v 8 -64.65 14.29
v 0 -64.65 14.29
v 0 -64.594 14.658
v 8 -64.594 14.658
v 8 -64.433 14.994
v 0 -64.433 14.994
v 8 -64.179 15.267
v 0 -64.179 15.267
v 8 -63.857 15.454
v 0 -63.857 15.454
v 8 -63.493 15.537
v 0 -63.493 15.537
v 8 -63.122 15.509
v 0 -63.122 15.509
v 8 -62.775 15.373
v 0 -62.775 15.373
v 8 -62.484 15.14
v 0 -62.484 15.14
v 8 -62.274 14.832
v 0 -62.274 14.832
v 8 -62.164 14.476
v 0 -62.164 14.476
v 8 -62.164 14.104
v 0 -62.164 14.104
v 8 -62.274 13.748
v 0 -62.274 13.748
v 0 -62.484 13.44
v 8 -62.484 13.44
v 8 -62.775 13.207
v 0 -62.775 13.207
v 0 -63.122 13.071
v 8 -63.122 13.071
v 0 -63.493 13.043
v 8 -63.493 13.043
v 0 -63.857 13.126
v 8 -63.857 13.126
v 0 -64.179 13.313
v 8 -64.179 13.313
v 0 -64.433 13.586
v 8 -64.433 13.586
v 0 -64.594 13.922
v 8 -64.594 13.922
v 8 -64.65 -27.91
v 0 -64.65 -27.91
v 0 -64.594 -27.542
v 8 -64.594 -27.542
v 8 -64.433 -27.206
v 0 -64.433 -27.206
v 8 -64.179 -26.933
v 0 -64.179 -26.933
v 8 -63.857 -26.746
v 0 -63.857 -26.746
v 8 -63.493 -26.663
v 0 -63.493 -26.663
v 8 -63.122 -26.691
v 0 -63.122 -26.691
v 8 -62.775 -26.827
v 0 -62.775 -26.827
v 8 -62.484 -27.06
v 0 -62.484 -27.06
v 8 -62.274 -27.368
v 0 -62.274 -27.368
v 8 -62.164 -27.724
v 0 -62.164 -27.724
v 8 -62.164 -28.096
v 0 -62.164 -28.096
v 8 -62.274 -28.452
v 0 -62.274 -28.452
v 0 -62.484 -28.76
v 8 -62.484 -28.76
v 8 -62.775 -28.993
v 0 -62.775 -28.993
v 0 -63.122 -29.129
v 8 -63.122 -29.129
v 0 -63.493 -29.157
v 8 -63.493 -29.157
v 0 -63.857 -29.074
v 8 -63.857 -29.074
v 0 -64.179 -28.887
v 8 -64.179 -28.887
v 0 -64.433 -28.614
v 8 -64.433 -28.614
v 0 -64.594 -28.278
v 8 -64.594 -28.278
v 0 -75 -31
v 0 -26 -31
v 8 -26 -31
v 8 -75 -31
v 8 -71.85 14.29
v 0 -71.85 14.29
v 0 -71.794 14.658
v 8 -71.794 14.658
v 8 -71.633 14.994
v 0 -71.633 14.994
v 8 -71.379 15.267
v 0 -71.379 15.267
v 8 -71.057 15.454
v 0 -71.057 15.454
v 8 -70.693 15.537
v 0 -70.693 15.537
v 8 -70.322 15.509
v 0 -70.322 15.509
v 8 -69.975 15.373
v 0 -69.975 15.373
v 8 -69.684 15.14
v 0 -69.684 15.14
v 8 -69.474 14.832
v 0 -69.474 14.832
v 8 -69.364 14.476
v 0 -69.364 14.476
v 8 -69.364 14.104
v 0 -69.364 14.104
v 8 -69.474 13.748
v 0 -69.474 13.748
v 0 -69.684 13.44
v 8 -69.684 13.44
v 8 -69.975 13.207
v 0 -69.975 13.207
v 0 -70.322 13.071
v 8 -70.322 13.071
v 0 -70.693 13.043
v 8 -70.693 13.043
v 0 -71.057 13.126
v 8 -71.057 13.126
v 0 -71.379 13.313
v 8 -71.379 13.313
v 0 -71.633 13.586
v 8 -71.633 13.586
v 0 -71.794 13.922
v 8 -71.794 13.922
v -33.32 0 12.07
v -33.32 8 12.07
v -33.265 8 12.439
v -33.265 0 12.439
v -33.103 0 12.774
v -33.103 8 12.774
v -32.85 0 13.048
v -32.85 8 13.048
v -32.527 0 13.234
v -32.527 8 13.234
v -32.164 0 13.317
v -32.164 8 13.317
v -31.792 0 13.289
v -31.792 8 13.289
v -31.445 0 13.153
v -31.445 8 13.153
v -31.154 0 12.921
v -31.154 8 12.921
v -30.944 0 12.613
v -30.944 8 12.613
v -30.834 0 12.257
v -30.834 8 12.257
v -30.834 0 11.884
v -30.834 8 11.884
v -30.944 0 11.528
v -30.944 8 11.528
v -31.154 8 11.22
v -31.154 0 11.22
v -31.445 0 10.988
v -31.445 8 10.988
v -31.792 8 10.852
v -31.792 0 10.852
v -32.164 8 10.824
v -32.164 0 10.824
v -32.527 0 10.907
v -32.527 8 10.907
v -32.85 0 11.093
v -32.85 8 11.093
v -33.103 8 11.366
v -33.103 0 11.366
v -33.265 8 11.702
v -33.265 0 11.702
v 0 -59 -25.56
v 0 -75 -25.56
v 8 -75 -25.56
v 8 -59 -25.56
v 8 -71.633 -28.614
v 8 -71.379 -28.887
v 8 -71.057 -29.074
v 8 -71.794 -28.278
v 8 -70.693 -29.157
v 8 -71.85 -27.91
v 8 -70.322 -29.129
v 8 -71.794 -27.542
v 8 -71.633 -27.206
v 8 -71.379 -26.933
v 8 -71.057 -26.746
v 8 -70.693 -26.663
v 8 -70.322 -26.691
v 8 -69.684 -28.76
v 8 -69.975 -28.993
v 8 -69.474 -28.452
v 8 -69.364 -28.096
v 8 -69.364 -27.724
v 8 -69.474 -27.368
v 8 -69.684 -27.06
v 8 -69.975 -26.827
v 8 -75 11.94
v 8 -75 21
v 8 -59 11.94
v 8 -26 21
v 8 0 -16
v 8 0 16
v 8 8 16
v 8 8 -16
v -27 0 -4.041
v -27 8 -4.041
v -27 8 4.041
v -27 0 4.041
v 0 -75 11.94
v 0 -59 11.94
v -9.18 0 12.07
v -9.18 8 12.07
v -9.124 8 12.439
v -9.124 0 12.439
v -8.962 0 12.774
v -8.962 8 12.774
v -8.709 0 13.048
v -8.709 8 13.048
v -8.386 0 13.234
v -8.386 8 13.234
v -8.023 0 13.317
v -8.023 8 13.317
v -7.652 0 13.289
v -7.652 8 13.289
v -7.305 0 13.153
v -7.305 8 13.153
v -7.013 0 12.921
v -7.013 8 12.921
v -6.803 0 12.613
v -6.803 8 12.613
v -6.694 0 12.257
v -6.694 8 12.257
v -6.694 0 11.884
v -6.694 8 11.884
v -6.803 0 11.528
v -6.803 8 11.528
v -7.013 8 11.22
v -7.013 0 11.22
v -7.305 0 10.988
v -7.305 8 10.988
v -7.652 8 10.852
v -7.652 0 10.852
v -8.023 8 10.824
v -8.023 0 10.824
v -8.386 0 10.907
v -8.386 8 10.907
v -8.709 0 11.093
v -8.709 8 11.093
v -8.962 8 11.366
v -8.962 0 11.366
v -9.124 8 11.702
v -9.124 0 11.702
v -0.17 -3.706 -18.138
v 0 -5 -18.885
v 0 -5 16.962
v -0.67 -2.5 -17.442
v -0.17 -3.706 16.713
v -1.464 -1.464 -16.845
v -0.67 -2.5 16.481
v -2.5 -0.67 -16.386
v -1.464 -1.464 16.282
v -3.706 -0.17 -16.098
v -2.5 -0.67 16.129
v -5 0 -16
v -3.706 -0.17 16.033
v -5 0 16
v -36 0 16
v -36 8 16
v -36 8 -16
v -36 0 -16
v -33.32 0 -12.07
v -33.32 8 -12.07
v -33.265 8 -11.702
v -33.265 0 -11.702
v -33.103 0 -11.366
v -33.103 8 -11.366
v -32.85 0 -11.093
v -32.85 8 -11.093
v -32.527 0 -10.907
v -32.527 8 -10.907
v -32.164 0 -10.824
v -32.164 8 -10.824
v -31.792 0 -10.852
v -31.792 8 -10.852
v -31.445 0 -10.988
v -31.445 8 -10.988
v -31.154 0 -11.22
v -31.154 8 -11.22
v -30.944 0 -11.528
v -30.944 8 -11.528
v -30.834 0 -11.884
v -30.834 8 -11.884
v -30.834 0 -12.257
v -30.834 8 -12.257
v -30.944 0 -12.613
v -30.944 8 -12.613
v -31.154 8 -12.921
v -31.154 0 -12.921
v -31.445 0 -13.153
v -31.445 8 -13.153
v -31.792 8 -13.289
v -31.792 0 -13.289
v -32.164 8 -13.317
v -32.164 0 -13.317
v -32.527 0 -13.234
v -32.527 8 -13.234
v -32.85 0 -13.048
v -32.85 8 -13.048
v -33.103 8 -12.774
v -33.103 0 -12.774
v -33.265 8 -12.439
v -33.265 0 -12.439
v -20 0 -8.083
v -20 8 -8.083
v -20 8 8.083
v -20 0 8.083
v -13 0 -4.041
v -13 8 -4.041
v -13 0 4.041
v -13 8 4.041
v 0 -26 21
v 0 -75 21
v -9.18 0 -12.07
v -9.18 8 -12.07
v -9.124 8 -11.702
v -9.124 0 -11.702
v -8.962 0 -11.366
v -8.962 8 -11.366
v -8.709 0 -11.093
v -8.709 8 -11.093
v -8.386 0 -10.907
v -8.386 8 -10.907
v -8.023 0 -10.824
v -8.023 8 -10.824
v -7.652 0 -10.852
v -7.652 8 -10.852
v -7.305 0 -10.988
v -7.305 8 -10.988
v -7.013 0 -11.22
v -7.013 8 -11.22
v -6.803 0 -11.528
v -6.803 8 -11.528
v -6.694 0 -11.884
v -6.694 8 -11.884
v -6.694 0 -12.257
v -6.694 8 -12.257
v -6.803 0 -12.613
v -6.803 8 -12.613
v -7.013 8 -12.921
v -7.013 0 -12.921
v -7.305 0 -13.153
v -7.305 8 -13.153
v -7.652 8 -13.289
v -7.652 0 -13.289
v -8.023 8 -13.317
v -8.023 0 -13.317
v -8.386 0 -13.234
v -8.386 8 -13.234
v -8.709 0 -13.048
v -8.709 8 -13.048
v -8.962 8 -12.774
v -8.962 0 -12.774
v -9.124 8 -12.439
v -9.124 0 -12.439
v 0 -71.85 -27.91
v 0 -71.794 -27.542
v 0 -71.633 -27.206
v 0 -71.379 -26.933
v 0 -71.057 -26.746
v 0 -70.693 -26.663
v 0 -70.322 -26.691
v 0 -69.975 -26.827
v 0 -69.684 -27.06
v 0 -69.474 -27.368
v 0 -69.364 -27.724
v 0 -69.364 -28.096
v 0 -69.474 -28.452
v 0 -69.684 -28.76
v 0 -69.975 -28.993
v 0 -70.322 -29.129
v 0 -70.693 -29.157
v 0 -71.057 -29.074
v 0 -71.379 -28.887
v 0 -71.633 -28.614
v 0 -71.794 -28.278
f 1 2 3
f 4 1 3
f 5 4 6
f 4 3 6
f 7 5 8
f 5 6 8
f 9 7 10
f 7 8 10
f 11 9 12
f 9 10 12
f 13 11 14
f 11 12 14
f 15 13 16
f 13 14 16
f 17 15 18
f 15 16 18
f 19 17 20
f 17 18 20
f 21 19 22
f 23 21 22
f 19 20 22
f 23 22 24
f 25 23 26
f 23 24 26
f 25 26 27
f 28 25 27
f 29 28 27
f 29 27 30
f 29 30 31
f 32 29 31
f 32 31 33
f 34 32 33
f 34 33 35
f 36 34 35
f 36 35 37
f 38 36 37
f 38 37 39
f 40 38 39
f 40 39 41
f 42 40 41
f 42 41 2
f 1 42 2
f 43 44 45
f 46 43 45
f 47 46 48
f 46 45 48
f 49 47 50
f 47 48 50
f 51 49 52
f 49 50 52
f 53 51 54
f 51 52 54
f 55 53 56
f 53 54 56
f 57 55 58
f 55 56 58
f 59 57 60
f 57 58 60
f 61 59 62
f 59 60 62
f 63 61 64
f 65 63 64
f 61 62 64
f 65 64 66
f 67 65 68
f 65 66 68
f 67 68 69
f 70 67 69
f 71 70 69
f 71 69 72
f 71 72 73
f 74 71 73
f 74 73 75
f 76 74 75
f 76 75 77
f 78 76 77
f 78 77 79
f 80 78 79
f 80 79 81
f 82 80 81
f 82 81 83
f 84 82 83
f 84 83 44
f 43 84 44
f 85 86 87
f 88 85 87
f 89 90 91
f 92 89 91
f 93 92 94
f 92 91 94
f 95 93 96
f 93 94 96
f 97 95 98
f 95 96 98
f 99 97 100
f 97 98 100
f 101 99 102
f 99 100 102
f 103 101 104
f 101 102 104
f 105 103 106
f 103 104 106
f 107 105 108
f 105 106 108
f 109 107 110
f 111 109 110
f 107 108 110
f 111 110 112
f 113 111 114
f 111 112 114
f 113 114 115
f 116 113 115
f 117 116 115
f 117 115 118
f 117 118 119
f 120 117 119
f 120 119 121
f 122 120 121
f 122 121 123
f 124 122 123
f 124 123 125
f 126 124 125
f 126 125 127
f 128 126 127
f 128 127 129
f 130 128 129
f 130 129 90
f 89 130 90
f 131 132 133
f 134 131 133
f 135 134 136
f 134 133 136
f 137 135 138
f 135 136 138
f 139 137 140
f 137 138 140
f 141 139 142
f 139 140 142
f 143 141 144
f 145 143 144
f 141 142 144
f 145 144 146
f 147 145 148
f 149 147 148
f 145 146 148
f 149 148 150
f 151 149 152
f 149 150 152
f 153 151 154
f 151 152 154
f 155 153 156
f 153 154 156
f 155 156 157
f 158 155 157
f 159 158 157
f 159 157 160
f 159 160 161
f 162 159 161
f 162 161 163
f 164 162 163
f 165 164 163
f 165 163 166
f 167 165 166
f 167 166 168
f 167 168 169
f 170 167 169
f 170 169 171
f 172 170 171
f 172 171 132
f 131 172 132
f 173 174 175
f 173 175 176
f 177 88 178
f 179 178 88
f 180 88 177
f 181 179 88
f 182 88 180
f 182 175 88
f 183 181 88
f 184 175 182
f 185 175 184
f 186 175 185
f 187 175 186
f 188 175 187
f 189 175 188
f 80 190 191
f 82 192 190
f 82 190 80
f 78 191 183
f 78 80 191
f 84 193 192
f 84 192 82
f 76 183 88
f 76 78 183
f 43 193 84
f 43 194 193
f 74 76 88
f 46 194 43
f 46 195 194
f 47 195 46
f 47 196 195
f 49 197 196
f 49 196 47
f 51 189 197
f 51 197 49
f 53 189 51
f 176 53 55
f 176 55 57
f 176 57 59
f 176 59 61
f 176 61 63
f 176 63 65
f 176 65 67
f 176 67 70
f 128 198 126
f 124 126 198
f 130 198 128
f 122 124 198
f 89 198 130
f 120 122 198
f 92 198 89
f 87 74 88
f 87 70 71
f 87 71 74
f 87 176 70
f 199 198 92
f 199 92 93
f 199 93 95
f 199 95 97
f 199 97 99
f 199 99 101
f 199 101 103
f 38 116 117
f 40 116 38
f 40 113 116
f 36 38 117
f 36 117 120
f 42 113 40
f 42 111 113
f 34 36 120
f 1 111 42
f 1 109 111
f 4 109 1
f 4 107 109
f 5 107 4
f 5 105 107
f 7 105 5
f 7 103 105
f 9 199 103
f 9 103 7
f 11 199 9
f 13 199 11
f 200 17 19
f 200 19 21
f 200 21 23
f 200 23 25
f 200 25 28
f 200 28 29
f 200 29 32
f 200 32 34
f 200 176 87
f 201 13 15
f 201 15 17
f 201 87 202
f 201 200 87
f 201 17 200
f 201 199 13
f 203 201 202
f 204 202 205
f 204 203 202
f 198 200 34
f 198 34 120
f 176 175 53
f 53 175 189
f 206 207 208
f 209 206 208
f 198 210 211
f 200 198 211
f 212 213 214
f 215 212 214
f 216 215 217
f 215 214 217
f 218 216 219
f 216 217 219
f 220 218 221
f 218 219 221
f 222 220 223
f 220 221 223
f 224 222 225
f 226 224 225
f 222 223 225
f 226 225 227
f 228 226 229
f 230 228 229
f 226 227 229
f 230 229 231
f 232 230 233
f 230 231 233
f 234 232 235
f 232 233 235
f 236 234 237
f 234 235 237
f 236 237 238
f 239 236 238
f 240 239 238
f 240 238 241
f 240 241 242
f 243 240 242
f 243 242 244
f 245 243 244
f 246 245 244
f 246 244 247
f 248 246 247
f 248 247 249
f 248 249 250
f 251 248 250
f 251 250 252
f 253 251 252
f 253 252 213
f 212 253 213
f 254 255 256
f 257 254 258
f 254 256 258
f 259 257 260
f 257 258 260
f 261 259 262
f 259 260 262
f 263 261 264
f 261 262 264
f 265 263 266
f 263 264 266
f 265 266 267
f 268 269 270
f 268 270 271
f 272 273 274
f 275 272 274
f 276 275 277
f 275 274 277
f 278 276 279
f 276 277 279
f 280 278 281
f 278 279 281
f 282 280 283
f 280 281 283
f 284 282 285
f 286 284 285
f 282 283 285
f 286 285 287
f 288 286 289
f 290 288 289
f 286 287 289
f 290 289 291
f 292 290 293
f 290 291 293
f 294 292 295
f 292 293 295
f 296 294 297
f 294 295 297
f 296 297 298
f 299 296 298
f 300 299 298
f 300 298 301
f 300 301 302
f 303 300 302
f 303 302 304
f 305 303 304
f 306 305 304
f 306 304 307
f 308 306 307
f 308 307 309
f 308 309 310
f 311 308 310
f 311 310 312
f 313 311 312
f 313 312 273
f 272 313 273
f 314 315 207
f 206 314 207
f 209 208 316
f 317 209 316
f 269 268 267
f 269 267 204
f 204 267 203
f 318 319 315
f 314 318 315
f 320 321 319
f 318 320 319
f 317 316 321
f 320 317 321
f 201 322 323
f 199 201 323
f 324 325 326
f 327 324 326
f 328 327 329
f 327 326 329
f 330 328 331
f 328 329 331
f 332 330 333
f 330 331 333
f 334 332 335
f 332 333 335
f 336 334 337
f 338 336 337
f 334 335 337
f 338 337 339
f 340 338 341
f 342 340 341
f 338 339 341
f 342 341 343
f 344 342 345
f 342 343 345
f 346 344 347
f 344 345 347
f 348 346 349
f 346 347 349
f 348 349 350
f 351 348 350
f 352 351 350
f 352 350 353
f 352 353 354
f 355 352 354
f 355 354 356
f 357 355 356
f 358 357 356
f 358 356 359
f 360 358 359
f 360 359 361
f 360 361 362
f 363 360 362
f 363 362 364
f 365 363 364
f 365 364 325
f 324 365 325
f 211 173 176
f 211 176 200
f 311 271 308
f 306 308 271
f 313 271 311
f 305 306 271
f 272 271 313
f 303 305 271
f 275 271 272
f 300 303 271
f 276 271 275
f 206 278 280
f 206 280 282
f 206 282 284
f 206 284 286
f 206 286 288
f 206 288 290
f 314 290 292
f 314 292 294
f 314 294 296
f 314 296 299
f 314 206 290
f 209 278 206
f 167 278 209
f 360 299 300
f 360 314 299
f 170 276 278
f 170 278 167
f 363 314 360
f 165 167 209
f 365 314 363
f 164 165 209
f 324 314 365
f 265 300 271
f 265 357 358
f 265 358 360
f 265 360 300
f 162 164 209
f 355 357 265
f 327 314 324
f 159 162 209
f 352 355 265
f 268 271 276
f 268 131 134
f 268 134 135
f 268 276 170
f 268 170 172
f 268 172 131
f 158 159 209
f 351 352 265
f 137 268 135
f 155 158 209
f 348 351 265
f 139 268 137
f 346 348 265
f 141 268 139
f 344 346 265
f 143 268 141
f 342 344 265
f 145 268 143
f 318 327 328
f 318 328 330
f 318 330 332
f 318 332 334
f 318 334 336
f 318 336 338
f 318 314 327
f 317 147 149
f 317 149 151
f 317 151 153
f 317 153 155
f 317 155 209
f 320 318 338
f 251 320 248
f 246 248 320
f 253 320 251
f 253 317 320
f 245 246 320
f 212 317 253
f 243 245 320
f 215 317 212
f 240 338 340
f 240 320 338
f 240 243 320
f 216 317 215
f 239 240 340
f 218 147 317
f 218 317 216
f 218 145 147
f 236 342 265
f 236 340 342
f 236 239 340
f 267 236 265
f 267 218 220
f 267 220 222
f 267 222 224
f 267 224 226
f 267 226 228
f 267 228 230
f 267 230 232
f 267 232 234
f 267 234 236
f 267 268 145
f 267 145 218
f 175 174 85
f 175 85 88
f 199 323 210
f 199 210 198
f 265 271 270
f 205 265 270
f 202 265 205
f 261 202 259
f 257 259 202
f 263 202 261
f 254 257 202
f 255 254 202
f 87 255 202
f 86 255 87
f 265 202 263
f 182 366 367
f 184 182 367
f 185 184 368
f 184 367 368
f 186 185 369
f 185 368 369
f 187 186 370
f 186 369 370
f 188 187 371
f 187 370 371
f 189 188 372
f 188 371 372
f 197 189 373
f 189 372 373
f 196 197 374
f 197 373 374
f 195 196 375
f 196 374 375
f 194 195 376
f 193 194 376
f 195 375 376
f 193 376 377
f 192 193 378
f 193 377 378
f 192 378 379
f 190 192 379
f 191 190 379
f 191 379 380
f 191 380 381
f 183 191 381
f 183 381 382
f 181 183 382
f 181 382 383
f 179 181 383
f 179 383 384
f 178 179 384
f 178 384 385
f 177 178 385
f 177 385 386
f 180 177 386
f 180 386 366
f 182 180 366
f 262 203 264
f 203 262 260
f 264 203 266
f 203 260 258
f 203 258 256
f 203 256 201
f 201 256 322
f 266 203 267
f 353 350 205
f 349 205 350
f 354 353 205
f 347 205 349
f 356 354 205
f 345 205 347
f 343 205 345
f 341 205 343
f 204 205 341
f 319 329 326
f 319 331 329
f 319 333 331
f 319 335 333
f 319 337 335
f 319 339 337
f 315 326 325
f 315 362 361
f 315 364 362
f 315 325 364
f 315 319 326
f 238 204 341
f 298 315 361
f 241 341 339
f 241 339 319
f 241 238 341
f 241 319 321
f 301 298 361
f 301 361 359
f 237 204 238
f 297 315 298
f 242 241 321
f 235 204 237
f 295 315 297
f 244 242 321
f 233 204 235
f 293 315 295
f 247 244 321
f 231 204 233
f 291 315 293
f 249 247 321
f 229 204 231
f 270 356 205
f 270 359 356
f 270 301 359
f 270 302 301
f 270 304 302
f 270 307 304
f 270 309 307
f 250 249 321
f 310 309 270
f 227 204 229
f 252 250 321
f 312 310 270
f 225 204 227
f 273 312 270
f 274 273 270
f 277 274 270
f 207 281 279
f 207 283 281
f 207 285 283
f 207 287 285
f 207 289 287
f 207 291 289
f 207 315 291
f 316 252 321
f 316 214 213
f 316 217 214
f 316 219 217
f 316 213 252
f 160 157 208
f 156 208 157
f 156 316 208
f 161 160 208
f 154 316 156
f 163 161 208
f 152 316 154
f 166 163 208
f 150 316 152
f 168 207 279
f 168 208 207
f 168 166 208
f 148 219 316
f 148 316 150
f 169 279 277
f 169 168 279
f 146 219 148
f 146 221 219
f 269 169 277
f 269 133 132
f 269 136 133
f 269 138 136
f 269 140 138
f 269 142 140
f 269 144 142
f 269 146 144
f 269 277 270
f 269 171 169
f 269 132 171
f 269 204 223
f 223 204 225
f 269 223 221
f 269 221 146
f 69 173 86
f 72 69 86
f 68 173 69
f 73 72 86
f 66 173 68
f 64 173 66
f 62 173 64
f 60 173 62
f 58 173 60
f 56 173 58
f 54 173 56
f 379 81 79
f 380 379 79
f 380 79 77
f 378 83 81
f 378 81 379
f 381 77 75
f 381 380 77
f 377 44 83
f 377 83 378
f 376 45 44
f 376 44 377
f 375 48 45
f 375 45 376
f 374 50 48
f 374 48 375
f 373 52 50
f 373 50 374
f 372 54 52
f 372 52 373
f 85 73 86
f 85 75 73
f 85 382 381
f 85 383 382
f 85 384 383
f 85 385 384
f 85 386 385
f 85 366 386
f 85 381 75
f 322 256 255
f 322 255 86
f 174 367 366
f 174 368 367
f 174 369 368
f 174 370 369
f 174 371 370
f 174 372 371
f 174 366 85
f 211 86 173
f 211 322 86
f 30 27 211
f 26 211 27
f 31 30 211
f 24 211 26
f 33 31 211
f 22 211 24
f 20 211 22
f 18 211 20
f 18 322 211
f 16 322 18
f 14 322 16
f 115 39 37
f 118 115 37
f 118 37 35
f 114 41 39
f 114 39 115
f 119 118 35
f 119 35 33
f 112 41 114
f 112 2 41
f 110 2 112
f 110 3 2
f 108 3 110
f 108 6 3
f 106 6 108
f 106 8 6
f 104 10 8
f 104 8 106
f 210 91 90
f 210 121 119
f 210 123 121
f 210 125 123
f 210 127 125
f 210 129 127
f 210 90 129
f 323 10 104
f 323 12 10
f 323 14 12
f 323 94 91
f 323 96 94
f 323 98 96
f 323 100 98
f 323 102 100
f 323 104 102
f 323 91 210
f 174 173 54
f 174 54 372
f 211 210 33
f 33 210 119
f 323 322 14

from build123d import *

# Parameters (mm, degrees)
BOSS_EXTRUDE1_DEPTH = 31
CUT_EXTRUDE1_REACH  = 97.635
SKETCH2_R           = 1.25
CUT_EXTRUDE2_REACH  = 90.781
SKETCH3_W           = 37.5
SKETCH3_H           = 16
CUT_EXTRUDE3_REACH  = 90.781
SKETCH4_R           = 1.25
CUT_EXTRUDE4_REACH  = 90.781
SKETCH6_W           = 36
SKETCH6_H           = 15
CUT_EXTRUDE5_REACH  = 90.781
FILLET1_R           = 5


with BuildPart() as part:
    # Sketch1 → Boss-Extrude1 (new, symmetric)
    with BuildSketch(Plane.XY):
        Polygon((-36, 0), (0, 0), (0, -75), (8, -75), (8, 8), (-36, 8), align=None)
    extrude(amount=BOSS_EXTRUDE1_DEPTH, both=True)

    # Sketch2 → Cut-Extrude1 (cut, up to next)
    with BuildSketch(Plane(origin=(0, 8, 0), x_dir=(1, 0, 0), z_dir=(0, 1, 0)), mode=Mode.PRIVATE) as cut_extrude1_sk1:
        with Locations(Location((-32.070312755, -12.070312755, 0), (0, 0, 180))):
            Circle(SKETCH2_R)
    cut_extrude1_tool1 = extrude(cut_extrude1_sk1.sketch, amount=-CUT_EXTRUDE1_REACH, mode=Mode.PRIVATE) & part.part
    # Sketch2 → Cut-Extrude1 (cut, up to next)
    with BuildSketch(Plane(origin=(0, 8, 0), x_dir=(1, 0, 0), z_dir=(0, 1, 0)), mode=Mode.PRIVATE) as cut_extrude1_sk2:
        with Locations(Location((-32.070312755, 12.070312755, 0), (0, 0, 180))):
            Circle(SKETCH2_R)
    cut_extrude1_tool2 = extrude(cut_extrude1_sk2.sketch, amount=-CUT_EXTRUDE1_REACH, mode=Mode.PRIVATE) & part.part
    # Sketch2 → Cut-Extrude1 (cut, up to next)
    with BuildSketch(Plane(origin=(0, 8, 0), x_dir=(1, 0, 0), z_dir=(0, 1, 0)), mode=Mode.PRIVATE) as cut_extrude1_sk3:
        with Locations(Location((-7.929687245, 12.070312755, 0), (0, 0, 180))):
            Circle(SKETCH2_R)
    cut_extrude1_tool3 = extrude(cut_extrude1_sk3.sketch, amount=-CUT_EXTRUDE1_REACH, mode=Mode.PRIVATE) & part.part
    # Sketch2 → Cut-Extrude1 (cut, up to next)
    with BuildSketch(Plane(origin=(0, 8, 0), x_dir=(1, 0, 0), z_dir=(0, 1, 0)), mode=Mode.PRIVATE) as cut_extrude1_sk4:
        with Locations(Location((-7.929687245, -12.070312755, 0), (0, 0, 180))):
            Circle(SKETCH2_R)
    cut_extrude1_tool4 = extrude(cut_extrude1_sk4.sketch, amount=-CUT_EXTRUDE1_REACH, mode=Mode.PRIVATE) & part.part
    # Sketch2 → Cut-Extrude1 (cut, up to next)
    with BuildSketch(Plane(origin=(0, 8, 0), x_dir=(1, 0, 0), z_dir=(0, 1, 0)), mode=Mode.PRIVATE) as cut_extrude1_sk5:
        Polygon((-13, 4.041451884), (-20, 8.082903769), (-27, 4.041451884), (-27, -4.041451884), (-20, -8.082903769), (-13, -4.041451884), align=None)
    cut_extrude1_tool5 = extrude(cut_extrude1_sk5.sketch, amount=-CUT_EXTRUDE1_REACH, mode=Mode.PRIVATE) & part.part
    add(cut_extrude1_tool1.solids().sort_by_distance((-32.070313, 8, 12.070313))[0], mode=Mode.SUBTRACT)
    add(cut_extrude1_tool2.solids().sort_by_distance((-32.070313, 8, -12.070313))[0], mode=Mode.SUBTRACT)
    add(cut_extrude1_tool3.solids().sort_by_distance((-7.929687, 8, -12.070313))[0], mode=Mode.SUBTRACT)
    add(cut_extrude1_tool4.solids().sort_by_distance((-7.929687, 8, 12.070313))[0], mode=Mode.SUBTRACT)
    add(cut_extrude1_tool5.solids().sort_by_distance((-20, 8, 0))[0], mode=Mode.SUBTRACT)

    # Sketch3 → Cut-Extrude2 (cut, up to next)
    with BuildSketch(Plane.ZY, mode=Mode.PRIVATE) as cut_extrude2_sk1:
        with Locations((-6.81, -67)):
            Rectangle(SKETCH3_W, SKETCH3_H)
    cut_extrude2_tool1 = extrude(cut_extrude2_sk1.sketch, amount=-CUT_EXTRUDE2_REACH, mode=Mode.PRIVATE) & part.part
    add(cut_extrude2_tool1.solids().sort_by_distance((0, -67, -6.81))[0], mode=Mode.SUBTRACT)

    # Sketch4 → Cut-Extrude3 (cut, up to next)
    with BuildSketch(Plane.ZY, mode=Mode.PRIVATE) as cut_extrude3_sk1:
        with Locations(Location((14.29, -70.6, 0), (0, 0, 270))):
            Circle(SKETCH4_R)
    cut_extrude3_tool1 = extrude(cut_extrude3_sk1.sketch, amount=-CUT_EXTRUDE3_REACH, mode=Mode.PRIVATE) & part.part
    # Sketch4 → Cut-Extrude3 (cut, up to next)
    with BuildSketch(Plane.ZY, mode=Mode.PRIVATE) as cut_extrude3_sk2:
        with Locations(Location((14.29, -63.4, 0), (0, 0, 270))):
            Circle(SKETCH4_R)
    cut_extrude3_tool2 = extrude(cut_extrude3_sk2.sketch, amount=-CUT_EXTRUDE3_REACH, mode=Mode.PRIVATE) & part.part
    # Sketch4 → Cut-Extrude3 (cut, up to next)
    with BuildSketch(Plane.ZY, mode=Mode.PRIVATE) as cut_extrude3_sk3:
        with Locations(Location((-27.91, -63.4, 0), (0, 0, 270))):
            Circle(SKETCH4_R)
    cut_extrude3_tool3 = extrude(cut_extrude3_sk3.sketch, amount=-CUT_EXTRUDE3_REACH, mode=Mode.PRIVATE) & part.part
    # Sketch4 → Cut-Extrude3 (cut, up to next)
    with BuildSketch(Plane.ZY, mode=Mode.PRIVATE) as cut_extrude3_sk4:
        with Locations(Location((-27.91, -70.6, 0), (0, 0, 270))):
            Circle(SKETCH4_R)
    cut_extrude3_tool4 = extrude(cut_extrude3_sk4.sketch, amount=-CUT_EXTRUDE3_REACH, mode=Mode.PRIVATE) & part.part
    add(cut_extrude3_tool1.solids().sort_by_distance((0, -70.6, 14.29))[0], mode=Mode.SUBTRACT)
    add(cut_extrude3_tool2.solids().sort_by_distance((0, -63.4, 14.29))[0], mode=Mode.SUBTRACT)
    add(cut_extrude3_tool3.solids().sort_by_distance((0, -63.4, -27.91))[0], mode=Mode.SUBTRACT)
    add(cut_extrude3_tool4.solids().sort_by_distance((0, -70.6, -27.91))[0], mode=Mode.SUBTRACT)

    # Sketch6 → Cut-Extrude4 (cut, up to next)
    with BuildSketch(Plane.XZ, mode=Mode.PRIVATE) as cut_extrude4_sk1:
        with Locations((-18, -23.5)):
            Rectangle(SKETCH6_W, SKETCH6_H)
    cut_extrude4_tool1 = extrude(cut_extrude4_sk1.sketch, amount=-CUT_EXTRUDE4_REACH, mode=Mode.PRIVATE) & part.part
    # Sketch6 → Cut-Extrude4 (cut, up to next)
    with BuildSketch(Plane.XZ, mode=Mode.PRIVATE) as cut_extrude4_sk2:
        with Locations((-18, 23.5)):
            Rectangle(SKETCH6_W, SKETCH6_H)
    cut_extrude4_tool2 = extrude(cut_extrude4_sk2.sketch, amount=-CUT_EXTRUDE4_REACH, mode=Mode.PRIVATE) & part.part
    add(cut_extrude4_tool1.solids().sort_by_distance((-18, 0, -23.5))[0], mode=Mode.SUBTRACT)
    add(cut_extrude4_tool2.solids().sort_by_distance((-18, 0, 23.5))[0], mode=Mode.SUBTRACT)

    # Sketch7 → Cut-Extrude5 (cut, up to next)
    with BuildSketch(Plane.ZY, mode=Mode.PRIVATE) as cut_extrude5_sk1:
        Polygon((-16, 0), (-31, -26), (-31, 8), (-16, 8), align=None)
    cut_extrude5_tool1 = extrude(cut_extrude5_sk1.sketch, amount=-CUT_EXTRUDE5_REACH, mode=Mode.PRIVATE) & part.part
    # Sketch7 → Cut-Extrude5 (cut, up to next)
    with BuildSketch(Plane.ZY, mode=Mode.PRIVATE) as cut_extrude5_sk2:
        Polygon((16, 0), (21, -26), (21, -75), (31, -75), (31, 8), (16, 8), align=None)
    cut_extrude5_tool2 = extrude(cut_extrude5_sk2.sketch, amount=-CUT_EXTRUDE5_REACH, mode=Mode.PRIVATE) & part.part
    add(cut_extrude5_tool1.solids().sort_by_distance((0, -3.84127, -25.047619))[0], mode=Mode.SUBTRACT)
    add(cut_extrude5_tool2.solids().sort_by_distance((0, -30.16934, 25.215686))[0], mode=Mode.SUBTRACT)

    # Fillet1
    fillet1_edges = [part.edges().sort_by_distance(p)[0] for p in [
        (0, 0, 0),
    ]]
    fillet(fillet1_edges, radius=FILLET1_R)


solid = part.part
